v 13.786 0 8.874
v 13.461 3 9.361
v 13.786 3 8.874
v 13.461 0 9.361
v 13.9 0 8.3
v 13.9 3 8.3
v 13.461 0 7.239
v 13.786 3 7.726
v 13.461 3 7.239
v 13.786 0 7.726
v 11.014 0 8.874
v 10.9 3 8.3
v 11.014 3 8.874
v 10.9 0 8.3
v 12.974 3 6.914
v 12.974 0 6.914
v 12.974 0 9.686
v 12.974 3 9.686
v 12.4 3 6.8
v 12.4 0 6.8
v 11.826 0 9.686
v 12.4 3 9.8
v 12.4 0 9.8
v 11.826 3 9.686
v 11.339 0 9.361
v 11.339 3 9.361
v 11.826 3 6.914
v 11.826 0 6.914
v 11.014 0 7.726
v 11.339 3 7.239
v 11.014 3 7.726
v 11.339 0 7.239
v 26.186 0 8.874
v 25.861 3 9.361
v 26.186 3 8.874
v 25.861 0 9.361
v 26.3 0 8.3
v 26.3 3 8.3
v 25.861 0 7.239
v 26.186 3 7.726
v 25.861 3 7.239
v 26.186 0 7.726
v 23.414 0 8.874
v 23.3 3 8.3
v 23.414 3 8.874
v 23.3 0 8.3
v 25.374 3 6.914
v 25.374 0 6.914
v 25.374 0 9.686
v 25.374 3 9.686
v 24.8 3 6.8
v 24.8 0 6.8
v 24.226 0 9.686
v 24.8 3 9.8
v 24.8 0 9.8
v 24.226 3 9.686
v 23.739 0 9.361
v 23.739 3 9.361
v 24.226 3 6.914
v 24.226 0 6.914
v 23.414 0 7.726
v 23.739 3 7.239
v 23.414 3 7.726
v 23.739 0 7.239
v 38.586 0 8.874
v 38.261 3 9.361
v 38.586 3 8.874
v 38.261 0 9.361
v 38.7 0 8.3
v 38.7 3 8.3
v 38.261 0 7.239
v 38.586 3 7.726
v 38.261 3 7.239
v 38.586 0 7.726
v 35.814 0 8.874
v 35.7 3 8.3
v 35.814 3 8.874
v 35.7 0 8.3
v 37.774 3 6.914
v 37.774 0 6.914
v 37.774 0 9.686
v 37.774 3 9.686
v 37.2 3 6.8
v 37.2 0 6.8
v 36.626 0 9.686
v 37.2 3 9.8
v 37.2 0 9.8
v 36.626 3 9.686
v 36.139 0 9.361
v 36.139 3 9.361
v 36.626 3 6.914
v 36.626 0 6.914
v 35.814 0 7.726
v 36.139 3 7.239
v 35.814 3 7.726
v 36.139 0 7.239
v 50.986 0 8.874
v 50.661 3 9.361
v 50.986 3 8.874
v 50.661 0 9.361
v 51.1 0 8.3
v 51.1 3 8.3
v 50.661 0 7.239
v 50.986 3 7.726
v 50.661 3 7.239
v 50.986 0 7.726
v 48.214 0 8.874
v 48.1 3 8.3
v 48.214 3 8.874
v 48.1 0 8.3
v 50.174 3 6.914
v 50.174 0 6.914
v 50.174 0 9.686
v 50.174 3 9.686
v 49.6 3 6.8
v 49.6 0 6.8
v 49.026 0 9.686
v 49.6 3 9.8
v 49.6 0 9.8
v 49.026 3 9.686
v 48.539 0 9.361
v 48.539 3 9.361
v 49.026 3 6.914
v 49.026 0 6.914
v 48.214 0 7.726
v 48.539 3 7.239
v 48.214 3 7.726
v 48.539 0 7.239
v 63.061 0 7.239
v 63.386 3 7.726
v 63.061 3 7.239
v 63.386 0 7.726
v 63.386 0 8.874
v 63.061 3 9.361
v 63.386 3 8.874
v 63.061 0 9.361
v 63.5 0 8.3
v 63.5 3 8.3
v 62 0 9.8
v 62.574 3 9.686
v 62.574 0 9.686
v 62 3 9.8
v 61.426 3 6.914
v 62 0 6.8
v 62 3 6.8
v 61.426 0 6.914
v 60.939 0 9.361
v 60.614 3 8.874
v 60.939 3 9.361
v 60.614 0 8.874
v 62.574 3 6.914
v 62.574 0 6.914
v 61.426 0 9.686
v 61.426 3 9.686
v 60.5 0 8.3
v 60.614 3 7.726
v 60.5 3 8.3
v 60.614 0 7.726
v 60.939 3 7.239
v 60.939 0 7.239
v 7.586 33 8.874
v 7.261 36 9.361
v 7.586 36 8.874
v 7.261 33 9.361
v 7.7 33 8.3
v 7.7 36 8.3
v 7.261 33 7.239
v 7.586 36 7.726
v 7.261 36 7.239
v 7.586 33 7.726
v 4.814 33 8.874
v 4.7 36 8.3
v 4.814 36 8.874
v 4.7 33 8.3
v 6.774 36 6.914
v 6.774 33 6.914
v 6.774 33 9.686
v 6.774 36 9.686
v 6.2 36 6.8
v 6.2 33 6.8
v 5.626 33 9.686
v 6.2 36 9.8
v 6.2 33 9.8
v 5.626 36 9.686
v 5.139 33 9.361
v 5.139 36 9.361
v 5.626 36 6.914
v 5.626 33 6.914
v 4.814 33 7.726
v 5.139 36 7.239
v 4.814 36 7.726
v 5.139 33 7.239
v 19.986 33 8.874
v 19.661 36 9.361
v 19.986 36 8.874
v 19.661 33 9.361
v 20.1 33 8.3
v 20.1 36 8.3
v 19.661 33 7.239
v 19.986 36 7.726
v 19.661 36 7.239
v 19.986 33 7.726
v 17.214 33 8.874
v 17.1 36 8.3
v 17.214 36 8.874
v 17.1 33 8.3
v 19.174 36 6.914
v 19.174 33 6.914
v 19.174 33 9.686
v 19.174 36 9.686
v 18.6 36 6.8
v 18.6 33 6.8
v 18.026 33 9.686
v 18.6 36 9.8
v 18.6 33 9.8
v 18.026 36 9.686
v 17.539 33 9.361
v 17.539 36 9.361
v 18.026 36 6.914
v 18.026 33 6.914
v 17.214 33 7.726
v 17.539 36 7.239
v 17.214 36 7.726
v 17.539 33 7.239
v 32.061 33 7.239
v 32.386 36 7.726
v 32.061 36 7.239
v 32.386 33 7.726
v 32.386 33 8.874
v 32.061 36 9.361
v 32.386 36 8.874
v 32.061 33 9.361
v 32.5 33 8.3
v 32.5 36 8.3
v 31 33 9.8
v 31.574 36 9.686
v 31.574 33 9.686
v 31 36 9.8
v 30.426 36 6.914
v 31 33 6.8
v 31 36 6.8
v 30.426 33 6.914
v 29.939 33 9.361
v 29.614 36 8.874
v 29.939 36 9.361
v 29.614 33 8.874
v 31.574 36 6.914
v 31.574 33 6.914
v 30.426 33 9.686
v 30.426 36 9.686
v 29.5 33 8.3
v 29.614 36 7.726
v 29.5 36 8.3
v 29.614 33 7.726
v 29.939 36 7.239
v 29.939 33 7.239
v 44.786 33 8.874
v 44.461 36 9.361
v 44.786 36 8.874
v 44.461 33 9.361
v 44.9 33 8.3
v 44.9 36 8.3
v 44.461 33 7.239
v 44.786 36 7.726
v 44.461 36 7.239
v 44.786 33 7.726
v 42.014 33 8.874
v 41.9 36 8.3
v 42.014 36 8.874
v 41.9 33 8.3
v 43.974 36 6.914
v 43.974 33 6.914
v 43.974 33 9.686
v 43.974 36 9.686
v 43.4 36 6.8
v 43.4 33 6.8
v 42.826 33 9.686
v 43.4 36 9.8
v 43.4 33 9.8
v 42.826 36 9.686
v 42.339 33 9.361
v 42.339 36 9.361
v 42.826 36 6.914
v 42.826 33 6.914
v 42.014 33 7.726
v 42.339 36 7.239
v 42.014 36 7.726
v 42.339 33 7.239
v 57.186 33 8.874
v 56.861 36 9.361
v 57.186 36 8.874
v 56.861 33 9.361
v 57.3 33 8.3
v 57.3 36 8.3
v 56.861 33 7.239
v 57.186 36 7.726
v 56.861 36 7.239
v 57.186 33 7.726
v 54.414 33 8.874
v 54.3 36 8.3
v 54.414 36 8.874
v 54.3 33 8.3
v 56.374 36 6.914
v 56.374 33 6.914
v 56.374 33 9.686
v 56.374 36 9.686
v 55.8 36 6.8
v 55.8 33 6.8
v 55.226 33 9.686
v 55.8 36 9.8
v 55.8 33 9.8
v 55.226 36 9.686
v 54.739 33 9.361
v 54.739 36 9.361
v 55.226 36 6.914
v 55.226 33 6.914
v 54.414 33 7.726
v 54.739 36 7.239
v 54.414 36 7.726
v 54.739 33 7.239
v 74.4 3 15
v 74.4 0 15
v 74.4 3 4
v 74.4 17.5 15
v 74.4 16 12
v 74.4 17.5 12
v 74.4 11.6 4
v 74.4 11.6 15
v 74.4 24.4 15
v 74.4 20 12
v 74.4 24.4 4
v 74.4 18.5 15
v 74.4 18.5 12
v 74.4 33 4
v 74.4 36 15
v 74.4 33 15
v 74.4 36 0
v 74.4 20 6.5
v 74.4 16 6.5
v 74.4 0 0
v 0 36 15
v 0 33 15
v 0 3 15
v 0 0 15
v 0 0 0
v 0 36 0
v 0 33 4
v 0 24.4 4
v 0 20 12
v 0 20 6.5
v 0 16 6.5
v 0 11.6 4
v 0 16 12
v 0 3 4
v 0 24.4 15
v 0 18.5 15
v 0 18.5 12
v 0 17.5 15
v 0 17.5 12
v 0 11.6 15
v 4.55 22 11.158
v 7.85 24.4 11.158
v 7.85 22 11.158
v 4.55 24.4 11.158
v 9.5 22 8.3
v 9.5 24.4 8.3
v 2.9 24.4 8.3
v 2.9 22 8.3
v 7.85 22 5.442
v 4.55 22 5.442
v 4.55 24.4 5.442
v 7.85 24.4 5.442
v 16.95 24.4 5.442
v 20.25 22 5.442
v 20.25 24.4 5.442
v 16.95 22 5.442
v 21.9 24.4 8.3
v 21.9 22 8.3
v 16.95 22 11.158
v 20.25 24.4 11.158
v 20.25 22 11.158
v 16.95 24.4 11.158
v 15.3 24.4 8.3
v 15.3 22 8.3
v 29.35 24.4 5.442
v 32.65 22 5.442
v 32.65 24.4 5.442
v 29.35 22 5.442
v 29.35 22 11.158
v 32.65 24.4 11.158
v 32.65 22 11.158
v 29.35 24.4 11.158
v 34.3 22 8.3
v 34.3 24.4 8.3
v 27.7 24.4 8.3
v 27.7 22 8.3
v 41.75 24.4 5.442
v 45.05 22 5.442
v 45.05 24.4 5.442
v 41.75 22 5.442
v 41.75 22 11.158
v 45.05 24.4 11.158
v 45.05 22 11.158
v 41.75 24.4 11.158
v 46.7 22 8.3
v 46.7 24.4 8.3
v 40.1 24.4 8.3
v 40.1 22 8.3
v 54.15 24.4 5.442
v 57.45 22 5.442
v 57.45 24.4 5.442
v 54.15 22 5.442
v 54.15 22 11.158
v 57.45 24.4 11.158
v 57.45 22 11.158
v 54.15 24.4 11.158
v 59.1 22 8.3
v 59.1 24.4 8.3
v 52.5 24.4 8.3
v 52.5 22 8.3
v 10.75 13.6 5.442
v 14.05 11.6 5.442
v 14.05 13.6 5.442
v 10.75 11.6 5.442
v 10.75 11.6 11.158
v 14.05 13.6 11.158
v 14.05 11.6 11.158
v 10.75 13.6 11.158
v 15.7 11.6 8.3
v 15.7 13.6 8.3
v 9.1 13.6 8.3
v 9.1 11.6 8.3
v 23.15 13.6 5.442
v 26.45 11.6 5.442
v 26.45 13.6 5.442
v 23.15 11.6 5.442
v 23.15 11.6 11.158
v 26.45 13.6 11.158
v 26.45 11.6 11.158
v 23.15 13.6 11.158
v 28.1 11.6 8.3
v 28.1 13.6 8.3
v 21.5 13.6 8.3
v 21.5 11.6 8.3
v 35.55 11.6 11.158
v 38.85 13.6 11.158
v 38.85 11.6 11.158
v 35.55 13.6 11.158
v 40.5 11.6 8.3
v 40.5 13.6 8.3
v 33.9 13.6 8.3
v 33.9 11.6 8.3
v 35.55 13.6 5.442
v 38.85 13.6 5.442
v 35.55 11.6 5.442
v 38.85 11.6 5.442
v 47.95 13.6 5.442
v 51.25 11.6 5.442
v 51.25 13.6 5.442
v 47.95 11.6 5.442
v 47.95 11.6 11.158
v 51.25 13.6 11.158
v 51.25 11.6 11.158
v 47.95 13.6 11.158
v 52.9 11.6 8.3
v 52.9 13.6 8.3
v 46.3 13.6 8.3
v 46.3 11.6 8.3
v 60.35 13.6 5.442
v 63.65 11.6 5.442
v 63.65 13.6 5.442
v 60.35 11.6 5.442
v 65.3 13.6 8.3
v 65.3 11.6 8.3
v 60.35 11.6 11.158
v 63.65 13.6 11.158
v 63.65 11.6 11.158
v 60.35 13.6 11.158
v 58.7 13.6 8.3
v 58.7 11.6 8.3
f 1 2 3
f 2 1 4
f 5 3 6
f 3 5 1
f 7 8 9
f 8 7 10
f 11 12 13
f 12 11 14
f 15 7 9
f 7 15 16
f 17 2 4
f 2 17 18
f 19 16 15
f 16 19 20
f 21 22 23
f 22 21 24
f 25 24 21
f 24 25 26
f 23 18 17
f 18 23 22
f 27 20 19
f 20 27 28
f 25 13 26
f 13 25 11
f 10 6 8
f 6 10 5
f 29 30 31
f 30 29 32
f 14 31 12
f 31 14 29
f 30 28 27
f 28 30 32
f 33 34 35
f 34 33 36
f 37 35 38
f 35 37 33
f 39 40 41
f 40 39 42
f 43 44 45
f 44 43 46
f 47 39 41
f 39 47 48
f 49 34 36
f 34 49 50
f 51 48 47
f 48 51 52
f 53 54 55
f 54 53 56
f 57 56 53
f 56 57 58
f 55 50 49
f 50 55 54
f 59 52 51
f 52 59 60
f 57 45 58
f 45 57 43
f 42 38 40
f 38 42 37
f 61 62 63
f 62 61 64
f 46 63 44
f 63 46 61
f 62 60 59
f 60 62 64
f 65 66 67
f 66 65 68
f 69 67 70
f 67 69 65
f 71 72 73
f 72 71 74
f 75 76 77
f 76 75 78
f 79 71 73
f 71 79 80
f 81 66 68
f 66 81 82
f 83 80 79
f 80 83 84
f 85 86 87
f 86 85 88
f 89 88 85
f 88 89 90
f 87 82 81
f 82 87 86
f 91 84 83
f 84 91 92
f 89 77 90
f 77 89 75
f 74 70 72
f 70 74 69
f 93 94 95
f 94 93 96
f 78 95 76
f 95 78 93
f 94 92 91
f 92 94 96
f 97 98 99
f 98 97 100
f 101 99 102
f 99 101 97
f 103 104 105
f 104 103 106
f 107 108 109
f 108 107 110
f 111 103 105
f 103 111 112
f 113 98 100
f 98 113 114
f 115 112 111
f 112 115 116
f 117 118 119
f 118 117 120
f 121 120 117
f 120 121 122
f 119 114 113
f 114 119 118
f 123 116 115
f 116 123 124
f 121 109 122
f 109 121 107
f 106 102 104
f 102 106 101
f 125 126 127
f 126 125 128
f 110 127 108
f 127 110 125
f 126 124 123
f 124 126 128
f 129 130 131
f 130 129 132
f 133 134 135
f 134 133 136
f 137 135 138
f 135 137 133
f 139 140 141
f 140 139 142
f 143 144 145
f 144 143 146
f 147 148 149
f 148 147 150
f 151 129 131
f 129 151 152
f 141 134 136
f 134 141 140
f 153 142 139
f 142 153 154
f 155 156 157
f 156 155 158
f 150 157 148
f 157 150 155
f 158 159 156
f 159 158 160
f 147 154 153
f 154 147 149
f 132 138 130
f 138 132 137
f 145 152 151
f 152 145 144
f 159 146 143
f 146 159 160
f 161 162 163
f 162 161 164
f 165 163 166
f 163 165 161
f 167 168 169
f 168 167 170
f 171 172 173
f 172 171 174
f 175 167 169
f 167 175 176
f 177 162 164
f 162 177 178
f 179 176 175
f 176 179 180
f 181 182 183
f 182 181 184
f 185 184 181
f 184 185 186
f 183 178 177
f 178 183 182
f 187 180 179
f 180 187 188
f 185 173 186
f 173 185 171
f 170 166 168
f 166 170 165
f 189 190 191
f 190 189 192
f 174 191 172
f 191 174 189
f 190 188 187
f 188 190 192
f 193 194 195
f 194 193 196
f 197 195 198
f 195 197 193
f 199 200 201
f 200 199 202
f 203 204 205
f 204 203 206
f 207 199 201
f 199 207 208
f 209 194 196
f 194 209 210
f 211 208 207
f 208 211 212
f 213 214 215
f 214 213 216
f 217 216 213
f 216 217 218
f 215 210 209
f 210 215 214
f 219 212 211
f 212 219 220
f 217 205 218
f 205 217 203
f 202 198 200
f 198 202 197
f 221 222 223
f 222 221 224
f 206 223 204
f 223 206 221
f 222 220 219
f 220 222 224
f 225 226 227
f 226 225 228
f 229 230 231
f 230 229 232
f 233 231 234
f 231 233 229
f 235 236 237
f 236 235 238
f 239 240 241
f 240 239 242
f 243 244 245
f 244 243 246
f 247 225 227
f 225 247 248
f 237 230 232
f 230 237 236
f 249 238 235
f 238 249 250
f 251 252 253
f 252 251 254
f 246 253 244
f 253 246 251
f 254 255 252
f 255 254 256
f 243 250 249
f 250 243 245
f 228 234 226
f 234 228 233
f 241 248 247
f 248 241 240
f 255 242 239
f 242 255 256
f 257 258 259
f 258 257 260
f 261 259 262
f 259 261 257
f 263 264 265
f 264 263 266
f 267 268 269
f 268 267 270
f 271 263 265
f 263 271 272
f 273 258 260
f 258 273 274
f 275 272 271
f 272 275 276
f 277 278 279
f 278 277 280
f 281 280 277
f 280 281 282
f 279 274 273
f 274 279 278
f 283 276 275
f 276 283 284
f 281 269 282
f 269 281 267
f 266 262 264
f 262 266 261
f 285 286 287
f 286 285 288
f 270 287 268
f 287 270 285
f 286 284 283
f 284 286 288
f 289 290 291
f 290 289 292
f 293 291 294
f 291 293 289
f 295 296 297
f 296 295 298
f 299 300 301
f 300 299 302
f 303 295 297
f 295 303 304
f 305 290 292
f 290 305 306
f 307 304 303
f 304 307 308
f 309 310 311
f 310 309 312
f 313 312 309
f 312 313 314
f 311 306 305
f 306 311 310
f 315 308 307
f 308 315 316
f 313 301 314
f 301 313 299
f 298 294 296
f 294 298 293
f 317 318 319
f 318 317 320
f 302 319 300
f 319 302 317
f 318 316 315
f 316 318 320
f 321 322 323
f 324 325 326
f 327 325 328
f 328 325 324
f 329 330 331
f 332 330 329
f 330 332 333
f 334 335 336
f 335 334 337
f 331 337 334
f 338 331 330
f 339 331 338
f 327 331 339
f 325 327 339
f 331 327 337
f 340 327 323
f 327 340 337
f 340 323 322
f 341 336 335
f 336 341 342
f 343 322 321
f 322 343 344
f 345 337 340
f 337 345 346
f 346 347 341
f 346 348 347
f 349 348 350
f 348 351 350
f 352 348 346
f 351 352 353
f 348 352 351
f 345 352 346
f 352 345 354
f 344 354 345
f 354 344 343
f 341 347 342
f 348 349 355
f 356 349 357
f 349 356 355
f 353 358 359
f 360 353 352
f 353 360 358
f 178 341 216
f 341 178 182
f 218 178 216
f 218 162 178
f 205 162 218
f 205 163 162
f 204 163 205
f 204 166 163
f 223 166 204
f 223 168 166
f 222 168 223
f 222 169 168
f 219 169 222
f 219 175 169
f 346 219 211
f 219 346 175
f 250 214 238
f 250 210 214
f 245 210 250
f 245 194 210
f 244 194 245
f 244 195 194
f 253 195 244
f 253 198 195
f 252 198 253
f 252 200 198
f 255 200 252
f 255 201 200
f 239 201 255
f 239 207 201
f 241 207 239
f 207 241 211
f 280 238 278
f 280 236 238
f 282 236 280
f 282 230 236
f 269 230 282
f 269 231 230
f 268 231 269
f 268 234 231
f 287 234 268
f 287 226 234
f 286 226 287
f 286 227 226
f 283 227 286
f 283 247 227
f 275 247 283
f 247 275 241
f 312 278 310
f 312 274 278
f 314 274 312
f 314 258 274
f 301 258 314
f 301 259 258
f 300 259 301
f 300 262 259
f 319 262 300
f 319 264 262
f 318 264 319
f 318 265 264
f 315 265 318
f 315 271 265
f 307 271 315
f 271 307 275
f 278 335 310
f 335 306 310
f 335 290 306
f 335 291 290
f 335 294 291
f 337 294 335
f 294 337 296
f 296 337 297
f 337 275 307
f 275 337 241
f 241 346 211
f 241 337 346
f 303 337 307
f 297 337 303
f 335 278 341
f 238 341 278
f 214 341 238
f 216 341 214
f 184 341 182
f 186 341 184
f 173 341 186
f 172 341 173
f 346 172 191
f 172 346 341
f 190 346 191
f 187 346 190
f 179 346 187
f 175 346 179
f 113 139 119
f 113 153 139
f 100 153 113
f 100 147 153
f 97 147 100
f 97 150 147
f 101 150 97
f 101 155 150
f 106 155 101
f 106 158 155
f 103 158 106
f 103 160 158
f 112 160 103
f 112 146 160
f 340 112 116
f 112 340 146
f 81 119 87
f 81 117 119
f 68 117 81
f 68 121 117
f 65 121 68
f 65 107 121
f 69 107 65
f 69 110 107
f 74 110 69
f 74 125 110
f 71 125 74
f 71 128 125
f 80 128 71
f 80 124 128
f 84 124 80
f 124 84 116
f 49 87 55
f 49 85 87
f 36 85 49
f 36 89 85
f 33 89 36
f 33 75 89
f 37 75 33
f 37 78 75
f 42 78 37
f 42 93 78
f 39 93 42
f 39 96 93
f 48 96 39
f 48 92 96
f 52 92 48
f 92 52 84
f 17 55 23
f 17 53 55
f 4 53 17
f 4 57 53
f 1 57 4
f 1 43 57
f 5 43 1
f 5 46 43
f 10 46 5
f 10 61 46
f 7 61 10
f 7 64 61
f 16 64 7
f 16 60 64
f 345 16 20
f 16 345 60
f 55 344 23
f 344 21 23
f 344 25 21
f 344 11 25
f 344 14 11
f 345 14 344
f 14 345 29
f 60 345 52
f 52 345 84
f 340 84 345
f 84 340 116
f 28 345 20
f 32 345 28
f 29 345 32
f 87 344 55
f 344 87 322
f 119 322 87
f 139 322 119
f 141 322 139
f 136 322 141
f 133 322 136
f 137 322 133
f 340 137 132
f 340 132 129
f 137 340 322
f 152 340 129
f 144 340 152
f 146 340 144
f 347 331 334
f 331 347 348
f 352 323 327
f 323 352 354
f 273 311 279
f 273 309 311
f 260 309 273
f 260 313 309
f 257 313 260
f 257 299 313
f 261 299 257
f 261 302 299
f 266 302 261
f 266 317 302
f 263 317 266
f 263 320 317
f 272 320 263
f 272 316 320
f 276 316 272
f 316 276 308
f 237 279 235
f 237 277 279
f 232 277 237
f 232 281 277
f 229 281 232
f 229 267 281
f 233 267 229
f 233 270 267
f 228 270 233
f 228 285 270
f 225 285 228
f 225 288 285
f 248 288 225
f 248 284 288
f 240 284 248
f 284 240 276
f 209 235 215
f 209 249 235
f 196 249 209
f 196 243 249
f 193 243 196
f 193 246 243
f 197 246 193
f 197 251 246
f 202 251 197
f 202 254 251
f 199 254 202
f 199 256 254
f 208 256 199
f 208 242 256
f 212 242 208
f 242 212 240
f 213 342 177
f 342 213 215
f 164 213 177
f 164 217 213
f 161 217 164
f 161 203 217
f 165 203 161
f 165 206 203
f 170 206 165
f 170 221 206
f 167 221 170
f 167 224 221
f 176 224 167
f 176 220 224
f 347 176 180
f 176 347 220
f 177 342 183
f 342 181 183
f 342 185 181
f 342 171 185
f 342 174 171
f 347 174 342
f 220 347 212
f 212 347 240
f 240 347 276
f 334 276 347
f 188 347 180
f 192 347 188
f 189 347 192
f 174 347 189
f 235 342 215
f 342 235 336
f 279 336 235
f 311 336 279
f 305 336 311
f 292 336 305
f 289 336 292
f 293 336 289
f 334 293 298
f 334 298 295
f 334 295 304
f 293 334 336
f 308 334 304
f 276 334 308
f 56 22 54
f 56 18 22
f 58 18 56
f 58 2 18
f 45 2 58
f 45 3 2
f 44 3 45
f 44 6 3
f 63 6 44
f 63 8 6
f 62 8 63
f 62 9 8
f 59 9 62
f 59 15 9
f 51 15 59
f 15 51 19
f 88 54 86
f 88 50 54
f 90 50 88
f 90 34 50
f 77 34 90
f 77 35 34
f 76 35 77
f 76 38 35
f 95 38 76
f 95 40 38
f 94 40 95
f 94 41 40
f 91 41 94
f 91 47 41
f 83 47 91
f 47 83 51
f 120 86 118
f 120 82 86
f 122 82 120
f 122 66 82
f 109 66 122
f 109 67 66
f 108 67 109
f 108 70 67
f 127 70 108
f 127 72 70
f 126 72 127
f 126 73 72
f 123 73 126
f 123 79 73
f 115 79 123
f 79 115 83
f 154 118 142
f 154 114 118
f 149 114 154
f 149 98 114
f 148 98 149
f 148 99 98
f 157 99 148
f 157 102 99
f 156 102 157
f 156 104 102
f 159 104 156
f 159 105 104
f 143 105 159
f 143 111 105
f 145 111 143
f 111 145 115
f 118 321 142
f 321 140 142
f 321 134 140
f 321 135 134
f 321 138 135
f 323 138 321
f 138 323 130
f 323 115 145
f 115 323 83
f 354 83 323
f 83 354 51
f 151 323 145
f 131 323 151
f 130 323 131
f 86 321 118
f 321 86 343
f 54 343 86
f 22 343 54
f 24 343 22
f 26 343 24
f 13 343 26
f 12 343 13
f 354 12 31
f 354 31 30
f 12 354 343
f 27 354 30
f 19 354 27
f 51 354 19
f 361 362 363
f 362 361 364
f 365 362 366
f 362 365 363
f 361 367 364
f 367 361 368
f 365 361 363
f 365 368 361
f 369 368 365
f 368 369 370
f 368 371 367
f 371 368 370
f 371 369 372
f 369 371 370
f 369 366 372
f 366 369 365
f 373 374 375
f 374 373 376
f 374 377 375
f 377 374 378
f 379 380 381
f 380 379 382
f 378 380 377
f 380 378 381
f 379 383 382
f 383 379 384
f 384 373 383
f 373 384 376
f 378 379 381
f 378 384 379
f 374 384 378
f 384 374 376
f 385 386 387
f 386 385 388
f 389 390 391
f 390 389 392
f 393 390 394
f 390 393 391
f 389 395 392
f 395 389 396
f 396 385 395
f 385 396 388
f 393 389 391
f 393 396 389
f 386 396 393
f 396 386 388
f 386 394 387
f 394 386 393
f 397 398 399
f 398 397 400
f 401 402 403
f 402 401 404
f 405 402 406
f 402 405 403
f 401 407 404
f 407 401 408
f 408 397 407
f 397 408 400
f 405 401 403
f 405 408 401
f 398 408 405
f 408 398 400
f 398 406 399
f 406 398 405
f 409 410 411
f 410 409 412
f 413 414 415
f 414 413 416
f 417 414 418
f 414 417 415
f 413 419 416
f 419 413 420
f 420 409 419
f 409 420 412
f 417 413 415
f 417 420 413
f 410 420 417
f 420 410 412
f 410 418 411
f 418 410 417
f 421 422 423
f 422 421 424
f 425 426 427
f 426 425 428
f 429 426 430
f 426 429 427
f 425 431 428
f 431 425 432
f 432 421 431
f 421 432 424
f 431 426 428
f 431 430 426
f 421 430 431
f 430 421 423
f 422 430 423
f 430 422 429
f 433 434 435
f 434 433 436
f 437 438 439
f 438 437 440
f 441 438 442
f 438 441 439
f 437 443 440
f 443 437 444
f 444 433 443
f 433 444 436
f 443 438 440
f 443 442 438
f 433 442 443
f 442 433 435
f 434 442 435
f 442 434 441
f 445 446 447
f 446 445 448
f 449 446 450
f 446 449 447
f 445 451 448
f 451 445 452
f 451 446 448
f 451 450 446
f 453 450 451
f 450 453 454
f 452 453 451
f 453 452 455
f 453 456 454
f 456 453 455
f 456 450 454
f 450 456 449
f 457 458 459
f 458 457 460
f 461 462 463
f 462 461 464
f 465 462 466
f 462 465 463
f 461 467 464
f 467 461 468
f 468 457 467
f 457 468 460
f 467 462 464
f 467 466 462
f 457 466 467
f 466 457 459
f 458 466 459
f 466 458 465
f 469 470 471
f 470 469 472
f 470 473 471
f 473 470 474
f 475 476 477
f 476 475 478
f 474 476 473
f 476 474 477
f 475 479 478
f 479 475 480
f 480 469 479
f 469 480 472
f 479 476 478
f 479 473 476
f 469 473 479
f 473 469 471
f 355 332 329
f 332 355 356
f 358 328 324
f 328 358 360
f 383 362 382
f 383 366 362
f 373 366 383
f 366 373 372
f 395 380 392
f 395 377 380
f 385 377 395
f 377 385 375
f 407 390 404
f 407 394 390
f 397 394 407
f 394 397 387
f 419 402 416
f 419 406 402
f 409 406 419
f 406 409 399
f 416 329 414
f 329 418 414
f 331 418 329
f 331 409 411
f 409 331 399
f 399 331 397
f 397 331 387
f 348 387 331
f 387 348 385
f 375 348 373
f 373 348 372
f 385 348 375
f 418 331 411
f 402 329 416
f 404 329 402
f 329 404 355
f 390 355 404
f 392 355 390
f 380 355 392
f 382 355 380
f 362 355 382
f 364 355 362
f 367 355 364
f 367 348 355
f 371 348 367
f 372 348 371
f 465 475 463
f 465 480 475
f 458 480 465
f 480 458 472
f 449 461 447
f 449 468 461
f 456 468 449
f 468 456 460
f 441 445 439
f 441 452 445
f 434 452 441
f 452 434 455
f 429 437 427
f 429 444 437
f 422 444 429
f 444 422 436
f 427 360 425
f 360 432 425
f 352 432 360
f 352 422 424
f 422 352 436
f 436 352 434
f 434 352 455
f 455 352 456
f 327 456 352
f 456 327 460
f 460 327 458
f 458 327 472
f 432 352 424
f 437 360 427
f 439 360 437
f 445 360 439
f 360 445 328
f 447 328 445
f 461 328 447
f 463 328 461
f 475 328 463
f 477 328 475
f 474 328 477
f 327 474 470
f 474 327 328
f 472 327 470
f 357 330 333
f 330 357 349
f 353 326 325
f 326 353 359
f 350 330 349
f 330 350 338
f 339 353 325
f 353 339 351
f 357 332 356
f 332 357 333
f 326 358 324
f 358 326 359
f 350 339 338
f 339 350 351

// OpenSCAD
//translate([-16.5+disth/2,24+pos,10])cylinder(r=3.3, h=20, $fn=6); 


largoTornilloInicial=20;
sobrante=2;
numTornillos = 5;

largo_caja=30;
alto_caja=15;
diametro_tornillo=3;
cabeza_tornillo=6.2;
grosorPared=3;

grosorSoporte=4.4;

largoTornillo=largoTornilloInicial-sobrante;


anchoCaja=cabeza_tornillo*((numTornillos*2)+2);



module caja(){
cube([anchoCaja, largoTornillo*2, alto_caja]);
}
module huecoCaja(){
	translate([-2, grosorPared, 4])
	cube([anchoCaja+4, (largoTornillo*2)- grosorPared*2, alto_caja]);
}

module soporte(){
	difference(){
		translate([0, largoTornillo-(grosorSoporte+sobrante), 4])
			cube([anchoCaja ,(sobrante*2) + (grosorSoporte*2),alto_caja-4]);
			tuercas();	
		translate([-1, largoTornillo-(sobrante), 4])
			cube([anchoCaja+2 ,(sobrante*2) ,alto_caja-7]);
		translate([-1, largoTornillo-0.5, 8])
			cube([anchoCaja+2 ,1 ,alto_caja-7]);
	}
translate([0, largoTornillo-(sobrante), 0])
			cube([anchoCaja,(sobrante*2) ,alto_caja-8.5]);
}


module tuercas(){

for( i = [1:2:numTornillos*2] ){
	translate([i* cabeza_tornillo, largoTornillo+1+(grosorSoporte+sobrante), 8.3])
	rotate([90,0,0]) cylinder(r=3.3, h=3.4, $fn=6);
}

for( i = [1:numTornillos] ){
	translate([(i*2)*cabeza_tornillo, grosorPared - 1 + largoTornillo-(grosorSoporte+sobrante), 8.3])
	rotate([90,0,0]) cylinder(r=3.3, h=3.4, $fn=6);
}

}



module tornillo(){
translate([0, 0, 0])
for( i = [1:numTornillos] ){
	translate([(i*2)*cabeza_tornillo, largoTornilloInicial, 8.3])
	rotate([90,0,0]) cylinder(r=1.5, h=largoTornilloInicial+3, $fn=16);
}
translate([0, 0, 0])
for( i = [1:2:numTornillos*2] ){
	translate([i* cabeza_tornillo, (largoTornilloInicial*2)-1, 8.3])
	rotate([90,0,0]) cylinder(r=1.5, h=largoTornilloInicial+3, $fn=16);
}
}


module final(){
	difference() {
		caja();
		huecoCaja();
		tornillo();
tornillo();
	}

soporte();


}
final();
